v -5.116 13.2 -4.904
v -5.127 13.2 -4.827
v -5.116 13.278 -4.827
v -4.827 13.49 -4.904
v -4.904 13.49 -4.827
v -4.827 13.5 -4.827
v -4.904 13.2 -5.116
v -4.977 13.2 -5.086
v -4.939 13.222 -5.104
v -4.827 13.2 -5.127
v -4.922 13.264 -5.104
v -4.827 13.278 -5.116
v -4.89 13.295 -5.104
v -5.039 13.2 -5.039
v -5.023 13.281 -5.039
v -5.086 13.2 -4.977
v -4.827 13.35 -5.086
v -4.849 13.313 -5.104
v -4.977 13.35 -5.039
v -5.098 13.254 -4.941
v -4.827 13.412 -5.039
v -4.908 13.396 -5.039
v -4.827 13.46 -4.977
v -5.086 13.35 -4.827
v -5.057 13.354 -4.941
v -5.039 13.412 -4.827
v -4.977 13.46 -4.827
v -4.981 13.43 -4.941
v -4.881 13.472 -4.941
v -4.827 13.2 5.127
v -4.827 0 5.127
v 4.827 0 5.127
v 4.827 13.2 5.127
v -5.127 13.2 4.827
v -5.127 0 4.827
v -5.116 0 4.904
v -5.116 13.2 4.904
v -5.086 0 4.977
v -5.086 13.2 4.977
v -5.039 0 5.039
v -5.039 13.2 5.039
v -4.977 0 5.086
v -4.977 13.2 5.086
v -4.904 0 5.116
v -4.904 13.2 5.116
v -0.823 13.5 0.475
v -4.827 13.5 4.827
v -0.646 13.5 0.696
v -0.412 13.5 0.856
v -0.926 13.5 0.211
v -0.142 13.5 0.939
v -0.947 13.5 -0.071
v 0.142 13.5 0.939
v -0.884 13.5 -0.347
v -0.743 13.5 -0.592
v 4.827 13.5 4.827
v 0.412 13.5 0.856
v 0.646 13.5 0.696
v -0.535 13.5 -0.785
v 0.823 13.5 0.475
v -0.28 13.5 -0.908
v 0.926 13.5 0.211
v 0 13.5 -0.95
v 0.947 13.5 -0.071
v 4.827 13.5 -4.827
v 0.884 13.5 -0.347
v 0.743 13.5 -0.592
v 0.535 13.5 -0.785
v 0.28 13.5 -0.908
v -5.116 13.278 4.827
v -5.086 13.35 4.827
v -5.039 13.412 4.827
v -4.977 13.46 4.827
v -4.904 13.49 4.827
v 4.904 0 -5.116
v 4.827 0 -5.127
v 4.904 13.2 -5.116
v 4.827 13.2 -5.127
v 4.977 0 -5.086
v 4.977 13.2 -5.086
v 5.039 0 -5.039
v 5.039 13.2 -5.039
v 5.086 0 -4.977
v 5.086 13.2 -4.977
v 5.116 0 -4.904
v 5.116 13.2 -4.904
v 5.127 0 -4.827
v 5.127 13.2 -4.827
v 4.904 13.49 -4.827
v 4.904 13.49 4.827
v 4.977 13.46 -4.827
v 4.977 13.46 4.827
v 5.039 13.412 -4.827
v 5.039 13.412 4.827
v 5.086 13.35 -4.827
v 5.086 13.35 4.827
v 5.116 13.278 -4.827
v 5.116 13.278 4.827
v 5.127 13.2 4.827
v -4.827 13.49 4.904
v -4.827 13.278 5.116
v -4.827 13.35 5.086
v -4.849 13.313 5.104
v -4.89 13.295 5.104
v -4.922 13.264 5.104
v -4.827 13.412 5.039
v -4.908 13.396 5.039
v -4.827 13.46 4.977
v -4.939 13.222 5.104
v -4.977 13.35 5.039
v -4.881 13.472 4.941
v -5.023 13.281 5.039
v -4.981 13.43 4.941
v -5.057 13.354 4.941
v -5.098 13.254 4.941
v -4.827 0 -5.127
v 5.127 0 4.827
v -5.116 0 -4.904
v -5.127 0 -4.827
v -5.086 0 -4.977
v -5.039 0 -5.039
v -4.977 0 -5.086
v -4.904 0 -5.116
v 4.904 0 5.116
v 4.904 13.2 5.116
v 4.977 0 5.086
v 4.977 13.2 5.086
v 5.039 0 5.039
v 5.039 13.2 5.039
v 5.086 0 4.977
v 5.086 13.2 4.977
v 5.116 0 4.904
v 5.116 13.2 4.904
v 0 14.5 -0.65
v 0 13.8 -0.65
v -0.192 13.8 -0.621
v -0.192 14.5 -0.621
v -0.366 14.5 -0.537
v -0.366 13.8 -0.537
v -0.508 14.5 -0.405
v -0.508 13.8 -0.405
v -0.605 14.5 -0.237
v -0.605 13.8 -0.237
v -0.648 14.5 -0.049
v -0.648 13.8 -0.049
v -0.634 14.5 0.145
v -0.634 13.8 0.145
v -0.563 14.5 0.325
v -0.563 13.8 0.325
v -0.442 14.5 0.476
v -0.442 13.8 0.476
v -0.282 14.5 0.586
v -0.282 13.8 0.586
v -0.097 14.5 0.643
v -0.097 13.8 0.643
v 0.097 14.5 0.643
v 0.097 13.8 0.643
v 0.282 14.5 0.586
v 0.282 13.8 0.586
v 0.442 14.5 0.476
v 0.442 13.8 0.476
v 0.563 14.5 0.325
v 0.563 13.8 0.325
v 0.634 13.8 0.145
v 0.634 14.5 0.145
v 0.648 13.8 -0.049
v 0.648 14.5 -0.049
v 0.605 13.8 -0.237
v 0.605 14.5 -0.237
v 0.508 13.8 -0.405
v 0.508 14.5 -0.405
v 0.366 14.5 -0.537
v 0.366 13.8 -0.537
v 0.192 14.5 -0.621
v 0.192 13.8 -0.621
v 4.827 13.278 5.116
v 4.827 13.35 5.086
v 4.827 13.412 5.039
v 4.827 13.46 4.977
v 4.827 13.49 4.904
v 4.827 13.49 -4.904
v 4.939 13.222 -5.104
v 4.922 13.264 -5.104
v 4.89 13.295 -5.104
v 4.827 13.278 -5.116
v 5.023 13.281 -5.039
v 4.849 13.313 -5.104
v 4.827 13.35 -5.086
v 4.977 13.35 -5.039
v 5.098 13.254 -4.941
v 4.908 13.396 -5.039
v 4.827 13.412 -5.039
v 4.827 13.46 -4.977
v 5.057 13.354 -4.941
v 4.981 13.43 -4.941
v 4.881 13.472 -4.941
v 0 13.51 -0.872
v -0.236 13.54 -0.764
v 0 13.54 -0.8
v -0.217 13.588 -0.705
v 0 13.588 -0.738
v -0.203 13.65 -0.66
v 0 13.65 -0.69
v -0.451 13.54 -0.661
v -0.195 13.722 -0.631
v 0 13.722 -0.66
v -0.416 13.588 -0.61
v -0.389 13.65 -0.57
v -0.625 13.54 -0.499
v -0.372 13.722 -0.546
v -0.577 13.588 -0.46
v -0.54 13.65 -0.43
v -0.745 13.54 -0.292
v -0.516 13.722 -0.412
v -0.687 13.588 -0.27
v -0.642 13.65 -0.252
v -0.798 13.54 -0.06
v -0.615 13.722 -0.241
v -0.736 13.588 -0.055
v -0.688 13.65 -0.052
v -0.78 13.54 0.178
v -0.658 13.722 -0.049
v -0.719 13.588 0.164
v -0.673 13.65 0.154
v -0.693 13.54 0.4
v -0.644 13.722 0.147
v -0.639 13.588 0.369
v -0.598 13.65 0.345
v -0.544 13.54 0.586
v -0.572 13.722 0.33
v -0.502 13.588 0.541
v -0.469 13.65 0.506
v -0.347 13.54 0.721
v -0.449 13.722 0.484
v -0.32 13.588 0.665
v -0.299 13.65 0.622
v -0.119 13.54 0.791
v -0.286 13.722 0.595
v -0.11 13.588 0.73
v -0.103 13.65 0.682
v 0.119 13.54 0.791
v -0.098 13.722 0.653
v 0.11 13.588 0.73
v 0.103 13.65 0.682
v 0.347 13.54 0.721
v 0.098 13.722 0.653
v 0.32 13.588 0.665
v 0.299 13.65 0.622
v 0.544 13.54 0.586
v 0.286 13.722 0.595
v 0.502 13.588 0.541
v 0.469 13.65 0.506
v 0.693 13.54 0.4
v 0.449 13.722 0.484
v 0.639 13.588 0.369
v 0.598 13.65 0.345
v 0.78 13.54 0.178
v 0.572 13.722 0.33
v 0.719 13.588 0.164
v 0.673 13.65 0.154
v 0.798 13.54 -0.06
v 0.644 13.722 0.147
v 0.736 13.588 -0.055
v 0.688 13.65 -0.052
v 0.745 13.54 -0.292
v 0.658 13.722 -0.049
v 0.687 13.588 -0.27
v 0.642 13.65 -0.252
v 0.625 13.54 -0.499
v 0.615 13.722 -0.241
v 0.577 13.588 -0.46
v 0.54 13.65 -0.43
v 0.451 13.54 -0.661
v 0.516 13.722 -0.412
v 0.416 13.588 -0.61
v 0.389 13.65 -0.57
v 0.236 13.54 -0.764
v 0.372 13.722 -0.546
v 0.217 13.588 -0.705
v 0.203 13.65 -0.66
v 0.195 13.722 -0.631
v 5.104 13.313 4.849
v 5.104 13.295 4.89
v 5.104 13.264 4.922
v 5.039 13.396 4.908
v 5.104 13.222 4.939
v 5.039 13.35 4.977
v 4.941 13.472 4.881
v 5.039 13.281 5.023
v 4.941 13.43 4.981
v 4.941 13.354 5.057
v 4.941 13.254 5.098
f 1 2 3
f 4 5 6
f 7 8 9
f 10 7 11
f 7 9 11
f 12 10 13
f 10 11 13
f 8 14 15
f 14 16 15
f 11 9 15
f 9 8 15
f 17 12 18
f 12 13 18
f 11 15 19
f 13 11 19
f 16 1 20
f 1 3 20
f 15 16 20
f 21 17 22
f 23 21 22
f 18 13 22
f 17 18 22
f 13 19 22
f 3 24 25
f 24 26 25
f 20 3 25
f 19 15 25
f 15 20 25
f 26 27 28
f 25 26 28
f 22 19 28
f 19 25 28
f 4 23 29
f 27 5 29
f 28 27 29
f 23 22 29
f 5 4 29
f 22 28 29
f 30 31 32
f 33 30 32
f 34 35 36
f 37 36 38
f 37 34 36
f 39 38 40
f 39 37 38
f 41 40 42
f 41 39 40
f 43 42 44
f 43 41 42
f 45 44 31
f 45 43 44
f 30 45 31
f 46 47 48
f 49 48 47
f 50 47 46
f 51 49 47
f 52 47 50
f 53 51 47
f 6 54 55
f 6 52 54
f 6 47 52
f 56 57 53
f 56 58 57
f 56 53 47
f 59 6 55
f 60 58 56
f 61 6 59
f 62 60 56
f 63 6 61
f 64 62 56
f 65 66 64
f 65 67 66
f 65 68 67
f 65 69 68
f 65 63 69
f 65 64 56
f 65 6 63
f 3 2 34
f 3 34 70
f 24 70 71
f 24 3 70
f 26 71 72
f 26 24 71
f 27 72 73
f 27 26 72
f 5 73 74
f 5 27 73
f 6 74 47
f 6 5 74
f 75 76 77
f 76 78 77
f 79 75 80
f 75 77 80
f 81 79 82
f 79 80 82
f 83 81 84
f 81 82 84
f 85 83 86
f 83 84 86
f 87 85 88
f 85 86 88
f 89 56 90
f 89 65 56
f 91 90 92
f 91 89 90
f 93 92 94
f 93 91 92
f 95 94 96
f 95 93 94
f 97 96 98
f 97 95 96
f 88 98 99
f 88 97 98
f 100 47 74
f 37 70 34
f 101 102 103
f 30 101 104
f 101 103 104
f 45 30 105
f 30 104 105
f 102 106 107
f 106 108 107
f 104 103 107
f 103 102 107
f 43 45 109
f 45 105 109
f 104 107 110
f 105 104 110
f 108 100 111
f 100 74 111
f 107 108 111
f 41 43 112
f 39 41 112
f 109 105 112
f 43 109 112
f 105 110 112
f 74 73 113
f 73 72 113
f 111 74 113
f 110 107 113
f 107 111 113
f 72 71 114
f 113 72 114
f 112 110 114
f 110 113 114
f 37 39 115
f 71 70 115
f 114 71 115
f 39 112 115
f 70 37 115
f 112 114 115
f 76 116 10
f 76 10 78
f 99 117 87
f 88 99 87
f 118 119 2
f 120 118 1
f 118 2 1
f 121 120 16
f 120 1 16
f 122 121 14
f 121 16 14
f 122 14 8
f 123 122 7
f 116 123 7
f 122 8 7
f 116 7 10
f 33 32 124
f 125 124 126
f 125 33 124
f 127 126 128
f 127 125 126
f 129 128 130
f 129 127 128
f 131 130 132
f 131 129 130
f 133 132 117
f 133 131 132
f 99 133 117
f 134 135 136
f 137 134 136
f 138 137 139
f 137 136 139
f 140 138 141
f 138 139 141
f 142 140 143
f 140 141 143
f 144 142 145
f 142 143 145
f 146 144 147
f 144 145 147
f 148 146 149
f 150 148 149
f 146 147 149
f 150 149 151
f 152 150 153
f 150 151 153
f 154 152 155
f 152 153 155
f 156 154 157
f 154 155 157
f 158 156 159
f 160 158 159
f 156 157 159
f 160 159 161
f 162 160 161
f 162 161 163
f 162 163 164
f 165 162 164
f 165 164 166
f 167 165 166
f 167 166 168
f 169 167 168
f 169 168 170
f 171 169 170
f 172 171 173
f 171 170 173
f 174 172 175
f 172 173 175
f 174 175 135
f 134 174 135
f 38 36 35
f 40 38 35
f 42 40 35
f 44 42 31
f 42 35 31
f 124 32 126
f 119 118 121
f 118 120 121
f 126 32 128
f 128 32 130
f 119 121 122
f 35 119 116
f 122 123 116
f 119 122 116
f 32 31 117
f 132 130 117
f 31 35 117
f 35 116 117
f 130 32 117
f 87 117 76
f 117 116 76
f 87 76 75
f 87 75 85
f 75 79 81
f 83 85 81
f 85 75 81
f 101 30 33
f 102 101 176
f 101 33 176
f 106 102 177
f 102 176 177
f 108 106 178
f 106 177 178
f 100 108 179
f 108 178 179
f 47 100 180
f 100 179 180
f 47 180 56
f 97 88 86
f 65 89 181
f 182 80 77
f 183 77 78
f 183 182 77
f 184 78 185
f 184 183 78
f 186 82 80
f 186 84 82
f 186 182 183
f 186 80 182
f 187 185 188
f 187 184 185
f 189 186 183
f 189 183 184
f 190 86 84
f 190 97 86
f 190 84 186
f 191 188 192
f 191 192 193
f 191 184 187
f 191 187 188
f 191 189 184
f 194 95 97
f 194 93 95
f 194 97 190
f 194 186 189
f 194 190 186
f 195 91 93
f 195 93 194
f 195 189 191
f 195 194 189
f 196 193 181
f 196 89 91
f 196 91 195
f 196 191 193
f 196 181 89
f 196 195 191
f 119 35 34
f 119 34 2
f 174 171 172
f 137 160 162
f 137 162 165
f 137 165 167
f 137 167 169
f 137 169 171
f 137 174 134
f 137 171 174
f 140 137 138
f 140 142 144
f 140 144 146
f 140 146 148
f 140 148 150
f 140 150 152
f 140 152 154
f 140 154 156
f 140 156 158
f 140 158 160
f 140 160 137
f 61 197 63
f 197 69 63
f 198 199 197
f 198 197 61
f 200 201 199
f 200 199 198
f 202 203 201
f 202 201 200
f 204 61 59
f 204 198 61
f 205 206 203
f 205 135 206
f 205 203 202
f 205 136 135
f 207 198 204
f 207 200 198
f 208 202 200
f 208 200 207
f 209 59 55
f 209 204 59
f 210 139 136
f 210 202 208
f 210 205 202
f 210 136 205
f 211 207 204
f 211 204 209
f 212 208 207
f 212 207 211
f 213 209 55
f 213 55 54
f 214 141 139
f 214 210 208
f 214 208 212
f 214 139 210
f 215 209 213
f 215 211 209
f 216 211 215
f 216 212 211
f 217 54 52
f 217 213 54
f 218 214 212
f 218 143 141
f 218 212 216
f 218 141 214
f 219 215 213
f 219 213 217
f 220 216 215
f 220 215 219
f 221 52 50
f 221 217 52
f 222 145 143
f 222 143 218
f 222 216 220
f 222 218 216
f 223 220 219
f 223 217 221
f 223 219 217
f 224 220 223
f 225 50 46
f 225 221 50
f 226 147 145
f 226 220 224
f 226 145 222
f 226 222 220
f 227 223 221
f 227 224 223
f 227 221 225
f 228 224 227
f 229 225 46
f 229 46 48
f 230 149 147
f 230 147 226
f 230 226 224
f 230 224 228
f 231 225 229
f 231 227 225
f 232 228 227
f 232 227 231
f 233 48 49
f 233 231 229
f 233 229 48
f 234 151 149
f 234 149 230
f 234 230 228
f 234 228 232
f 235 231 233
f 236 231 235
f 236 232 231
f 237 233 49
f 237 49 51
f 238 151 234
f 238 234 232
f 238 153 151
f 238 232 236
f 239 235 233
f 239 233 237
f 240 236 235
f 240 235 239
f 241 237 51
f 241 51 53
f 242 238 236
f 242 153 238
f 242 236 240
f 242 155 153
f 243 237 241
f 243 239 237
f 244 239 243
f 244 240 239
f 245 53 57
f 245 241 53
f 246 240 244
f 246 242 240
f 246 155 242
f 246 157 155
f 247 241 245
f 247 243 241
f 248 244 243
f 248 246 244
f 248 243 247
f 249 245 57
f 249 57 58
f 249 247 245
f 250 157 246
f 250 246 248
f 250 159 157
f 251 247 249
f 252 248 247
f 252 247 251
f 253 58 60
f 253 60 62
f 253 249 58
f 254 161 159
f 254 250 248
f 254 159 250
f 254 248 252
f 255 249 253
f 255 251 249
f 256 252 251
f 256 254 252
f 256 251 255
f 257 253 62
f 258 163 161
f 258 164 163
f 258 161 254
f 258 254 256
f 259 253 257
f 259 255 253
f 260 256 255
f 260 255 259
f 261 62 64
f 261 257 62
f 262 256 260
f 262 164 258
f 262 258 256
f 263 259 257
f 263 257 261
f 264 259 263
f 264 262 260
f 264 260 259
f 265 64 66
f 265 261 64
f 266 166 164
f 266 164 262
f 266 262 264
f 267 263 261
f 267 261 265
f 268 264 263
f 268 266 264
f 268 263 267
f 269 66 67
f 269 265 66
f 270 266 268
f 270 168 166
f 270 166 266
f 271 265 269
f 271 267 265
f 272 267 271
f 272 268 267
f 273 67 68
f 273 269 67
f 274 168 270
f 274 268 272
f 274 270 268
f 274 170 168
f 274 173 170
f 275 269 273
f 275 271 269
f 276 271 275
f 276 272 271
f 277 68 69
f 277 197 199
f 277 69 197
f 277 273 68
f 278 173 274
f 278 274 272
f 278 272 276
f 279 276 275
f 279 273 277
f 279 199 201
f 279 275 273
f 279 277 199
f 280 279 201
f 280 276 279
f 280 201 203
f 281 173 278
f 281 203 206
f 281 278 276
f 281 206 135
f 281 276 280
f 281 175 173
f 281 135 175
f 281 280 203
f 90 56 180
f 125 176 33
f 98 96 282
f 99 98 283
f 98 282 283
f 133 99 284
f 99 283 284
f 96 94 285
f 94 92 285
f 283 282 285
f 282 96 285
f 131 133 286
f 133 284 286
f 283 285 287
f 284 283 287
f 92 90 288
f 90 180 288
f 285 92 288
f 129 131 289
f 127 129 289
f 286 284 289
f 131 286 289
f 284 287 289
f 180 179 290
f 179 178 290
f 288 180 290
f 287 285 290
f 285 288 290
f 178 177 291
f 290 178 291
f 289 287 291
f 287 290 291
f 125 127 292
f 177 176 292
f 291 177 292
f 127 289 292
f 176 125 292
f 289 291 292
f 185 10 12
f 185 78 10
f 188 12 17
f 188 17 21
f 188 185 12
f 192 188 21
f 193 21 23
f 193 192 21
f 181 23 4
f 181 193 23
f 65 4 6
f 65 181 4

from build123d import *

# Parameters (mm, degrees)
SKETCH1_W           = 10.253048328
SKETCH1_H           = 10.253048328
BOSS_EXTRUDE1_DEPTH = 13.5
SKETCH2_R           = 0.65
BOSS_EXTRUDE2_DEPTH = 1
FILLET3_R           = 0.3


with BuildPart() as part:
    # Sketch1 → Boss-Extrude1 (new body)
    with BuildSketch(Plane(origin=(0, 0, 0), x_dir=(1, 0, 0), z_dir=(0, 1, 0))):
        Rectangle(SKETCH1_W, SKETCH1_H)
    extrude(amount=BOSS_EXTRUDE1_DEPTH)

    # Sketch2 → Boss-Extrude2 (add)
    with BuildSketch(Plane(origin=(0, 13.5, 0), x_dir=(1, 0, 0), z_dir=(0, 1, 0))):
        with Locations(Location((0, 0, 0), (0, 0, 90))):  # turned: the seam where the file's is
            Circle(SKETCH2_R)
    extrude(amount=BOSS_EXTRUDE2_DEPTH)

    # Fillet3
    fillet3_edges = [part.edges().sort_by_distance(p)[0] for p in [
        (-5.126524164, 13.5, 0),
        (0, 13.5, 0.65),
        (0, 13.5, 5.126524164),
        (5.126524164, 13.5, 0),
        (5.126524164, 6.75, 5.126524164),
        (-5.126524164, 6.75, 5.126524164),
        (-5.126524164, 6.75, -5.126524164),
        (5.126524164, 6.75, -5.126524164),
        (0, 13.5, -5.126524164),
    ]]
    fillet(fillet3_edges, radius=FILLET3_R)


solid = part.part
